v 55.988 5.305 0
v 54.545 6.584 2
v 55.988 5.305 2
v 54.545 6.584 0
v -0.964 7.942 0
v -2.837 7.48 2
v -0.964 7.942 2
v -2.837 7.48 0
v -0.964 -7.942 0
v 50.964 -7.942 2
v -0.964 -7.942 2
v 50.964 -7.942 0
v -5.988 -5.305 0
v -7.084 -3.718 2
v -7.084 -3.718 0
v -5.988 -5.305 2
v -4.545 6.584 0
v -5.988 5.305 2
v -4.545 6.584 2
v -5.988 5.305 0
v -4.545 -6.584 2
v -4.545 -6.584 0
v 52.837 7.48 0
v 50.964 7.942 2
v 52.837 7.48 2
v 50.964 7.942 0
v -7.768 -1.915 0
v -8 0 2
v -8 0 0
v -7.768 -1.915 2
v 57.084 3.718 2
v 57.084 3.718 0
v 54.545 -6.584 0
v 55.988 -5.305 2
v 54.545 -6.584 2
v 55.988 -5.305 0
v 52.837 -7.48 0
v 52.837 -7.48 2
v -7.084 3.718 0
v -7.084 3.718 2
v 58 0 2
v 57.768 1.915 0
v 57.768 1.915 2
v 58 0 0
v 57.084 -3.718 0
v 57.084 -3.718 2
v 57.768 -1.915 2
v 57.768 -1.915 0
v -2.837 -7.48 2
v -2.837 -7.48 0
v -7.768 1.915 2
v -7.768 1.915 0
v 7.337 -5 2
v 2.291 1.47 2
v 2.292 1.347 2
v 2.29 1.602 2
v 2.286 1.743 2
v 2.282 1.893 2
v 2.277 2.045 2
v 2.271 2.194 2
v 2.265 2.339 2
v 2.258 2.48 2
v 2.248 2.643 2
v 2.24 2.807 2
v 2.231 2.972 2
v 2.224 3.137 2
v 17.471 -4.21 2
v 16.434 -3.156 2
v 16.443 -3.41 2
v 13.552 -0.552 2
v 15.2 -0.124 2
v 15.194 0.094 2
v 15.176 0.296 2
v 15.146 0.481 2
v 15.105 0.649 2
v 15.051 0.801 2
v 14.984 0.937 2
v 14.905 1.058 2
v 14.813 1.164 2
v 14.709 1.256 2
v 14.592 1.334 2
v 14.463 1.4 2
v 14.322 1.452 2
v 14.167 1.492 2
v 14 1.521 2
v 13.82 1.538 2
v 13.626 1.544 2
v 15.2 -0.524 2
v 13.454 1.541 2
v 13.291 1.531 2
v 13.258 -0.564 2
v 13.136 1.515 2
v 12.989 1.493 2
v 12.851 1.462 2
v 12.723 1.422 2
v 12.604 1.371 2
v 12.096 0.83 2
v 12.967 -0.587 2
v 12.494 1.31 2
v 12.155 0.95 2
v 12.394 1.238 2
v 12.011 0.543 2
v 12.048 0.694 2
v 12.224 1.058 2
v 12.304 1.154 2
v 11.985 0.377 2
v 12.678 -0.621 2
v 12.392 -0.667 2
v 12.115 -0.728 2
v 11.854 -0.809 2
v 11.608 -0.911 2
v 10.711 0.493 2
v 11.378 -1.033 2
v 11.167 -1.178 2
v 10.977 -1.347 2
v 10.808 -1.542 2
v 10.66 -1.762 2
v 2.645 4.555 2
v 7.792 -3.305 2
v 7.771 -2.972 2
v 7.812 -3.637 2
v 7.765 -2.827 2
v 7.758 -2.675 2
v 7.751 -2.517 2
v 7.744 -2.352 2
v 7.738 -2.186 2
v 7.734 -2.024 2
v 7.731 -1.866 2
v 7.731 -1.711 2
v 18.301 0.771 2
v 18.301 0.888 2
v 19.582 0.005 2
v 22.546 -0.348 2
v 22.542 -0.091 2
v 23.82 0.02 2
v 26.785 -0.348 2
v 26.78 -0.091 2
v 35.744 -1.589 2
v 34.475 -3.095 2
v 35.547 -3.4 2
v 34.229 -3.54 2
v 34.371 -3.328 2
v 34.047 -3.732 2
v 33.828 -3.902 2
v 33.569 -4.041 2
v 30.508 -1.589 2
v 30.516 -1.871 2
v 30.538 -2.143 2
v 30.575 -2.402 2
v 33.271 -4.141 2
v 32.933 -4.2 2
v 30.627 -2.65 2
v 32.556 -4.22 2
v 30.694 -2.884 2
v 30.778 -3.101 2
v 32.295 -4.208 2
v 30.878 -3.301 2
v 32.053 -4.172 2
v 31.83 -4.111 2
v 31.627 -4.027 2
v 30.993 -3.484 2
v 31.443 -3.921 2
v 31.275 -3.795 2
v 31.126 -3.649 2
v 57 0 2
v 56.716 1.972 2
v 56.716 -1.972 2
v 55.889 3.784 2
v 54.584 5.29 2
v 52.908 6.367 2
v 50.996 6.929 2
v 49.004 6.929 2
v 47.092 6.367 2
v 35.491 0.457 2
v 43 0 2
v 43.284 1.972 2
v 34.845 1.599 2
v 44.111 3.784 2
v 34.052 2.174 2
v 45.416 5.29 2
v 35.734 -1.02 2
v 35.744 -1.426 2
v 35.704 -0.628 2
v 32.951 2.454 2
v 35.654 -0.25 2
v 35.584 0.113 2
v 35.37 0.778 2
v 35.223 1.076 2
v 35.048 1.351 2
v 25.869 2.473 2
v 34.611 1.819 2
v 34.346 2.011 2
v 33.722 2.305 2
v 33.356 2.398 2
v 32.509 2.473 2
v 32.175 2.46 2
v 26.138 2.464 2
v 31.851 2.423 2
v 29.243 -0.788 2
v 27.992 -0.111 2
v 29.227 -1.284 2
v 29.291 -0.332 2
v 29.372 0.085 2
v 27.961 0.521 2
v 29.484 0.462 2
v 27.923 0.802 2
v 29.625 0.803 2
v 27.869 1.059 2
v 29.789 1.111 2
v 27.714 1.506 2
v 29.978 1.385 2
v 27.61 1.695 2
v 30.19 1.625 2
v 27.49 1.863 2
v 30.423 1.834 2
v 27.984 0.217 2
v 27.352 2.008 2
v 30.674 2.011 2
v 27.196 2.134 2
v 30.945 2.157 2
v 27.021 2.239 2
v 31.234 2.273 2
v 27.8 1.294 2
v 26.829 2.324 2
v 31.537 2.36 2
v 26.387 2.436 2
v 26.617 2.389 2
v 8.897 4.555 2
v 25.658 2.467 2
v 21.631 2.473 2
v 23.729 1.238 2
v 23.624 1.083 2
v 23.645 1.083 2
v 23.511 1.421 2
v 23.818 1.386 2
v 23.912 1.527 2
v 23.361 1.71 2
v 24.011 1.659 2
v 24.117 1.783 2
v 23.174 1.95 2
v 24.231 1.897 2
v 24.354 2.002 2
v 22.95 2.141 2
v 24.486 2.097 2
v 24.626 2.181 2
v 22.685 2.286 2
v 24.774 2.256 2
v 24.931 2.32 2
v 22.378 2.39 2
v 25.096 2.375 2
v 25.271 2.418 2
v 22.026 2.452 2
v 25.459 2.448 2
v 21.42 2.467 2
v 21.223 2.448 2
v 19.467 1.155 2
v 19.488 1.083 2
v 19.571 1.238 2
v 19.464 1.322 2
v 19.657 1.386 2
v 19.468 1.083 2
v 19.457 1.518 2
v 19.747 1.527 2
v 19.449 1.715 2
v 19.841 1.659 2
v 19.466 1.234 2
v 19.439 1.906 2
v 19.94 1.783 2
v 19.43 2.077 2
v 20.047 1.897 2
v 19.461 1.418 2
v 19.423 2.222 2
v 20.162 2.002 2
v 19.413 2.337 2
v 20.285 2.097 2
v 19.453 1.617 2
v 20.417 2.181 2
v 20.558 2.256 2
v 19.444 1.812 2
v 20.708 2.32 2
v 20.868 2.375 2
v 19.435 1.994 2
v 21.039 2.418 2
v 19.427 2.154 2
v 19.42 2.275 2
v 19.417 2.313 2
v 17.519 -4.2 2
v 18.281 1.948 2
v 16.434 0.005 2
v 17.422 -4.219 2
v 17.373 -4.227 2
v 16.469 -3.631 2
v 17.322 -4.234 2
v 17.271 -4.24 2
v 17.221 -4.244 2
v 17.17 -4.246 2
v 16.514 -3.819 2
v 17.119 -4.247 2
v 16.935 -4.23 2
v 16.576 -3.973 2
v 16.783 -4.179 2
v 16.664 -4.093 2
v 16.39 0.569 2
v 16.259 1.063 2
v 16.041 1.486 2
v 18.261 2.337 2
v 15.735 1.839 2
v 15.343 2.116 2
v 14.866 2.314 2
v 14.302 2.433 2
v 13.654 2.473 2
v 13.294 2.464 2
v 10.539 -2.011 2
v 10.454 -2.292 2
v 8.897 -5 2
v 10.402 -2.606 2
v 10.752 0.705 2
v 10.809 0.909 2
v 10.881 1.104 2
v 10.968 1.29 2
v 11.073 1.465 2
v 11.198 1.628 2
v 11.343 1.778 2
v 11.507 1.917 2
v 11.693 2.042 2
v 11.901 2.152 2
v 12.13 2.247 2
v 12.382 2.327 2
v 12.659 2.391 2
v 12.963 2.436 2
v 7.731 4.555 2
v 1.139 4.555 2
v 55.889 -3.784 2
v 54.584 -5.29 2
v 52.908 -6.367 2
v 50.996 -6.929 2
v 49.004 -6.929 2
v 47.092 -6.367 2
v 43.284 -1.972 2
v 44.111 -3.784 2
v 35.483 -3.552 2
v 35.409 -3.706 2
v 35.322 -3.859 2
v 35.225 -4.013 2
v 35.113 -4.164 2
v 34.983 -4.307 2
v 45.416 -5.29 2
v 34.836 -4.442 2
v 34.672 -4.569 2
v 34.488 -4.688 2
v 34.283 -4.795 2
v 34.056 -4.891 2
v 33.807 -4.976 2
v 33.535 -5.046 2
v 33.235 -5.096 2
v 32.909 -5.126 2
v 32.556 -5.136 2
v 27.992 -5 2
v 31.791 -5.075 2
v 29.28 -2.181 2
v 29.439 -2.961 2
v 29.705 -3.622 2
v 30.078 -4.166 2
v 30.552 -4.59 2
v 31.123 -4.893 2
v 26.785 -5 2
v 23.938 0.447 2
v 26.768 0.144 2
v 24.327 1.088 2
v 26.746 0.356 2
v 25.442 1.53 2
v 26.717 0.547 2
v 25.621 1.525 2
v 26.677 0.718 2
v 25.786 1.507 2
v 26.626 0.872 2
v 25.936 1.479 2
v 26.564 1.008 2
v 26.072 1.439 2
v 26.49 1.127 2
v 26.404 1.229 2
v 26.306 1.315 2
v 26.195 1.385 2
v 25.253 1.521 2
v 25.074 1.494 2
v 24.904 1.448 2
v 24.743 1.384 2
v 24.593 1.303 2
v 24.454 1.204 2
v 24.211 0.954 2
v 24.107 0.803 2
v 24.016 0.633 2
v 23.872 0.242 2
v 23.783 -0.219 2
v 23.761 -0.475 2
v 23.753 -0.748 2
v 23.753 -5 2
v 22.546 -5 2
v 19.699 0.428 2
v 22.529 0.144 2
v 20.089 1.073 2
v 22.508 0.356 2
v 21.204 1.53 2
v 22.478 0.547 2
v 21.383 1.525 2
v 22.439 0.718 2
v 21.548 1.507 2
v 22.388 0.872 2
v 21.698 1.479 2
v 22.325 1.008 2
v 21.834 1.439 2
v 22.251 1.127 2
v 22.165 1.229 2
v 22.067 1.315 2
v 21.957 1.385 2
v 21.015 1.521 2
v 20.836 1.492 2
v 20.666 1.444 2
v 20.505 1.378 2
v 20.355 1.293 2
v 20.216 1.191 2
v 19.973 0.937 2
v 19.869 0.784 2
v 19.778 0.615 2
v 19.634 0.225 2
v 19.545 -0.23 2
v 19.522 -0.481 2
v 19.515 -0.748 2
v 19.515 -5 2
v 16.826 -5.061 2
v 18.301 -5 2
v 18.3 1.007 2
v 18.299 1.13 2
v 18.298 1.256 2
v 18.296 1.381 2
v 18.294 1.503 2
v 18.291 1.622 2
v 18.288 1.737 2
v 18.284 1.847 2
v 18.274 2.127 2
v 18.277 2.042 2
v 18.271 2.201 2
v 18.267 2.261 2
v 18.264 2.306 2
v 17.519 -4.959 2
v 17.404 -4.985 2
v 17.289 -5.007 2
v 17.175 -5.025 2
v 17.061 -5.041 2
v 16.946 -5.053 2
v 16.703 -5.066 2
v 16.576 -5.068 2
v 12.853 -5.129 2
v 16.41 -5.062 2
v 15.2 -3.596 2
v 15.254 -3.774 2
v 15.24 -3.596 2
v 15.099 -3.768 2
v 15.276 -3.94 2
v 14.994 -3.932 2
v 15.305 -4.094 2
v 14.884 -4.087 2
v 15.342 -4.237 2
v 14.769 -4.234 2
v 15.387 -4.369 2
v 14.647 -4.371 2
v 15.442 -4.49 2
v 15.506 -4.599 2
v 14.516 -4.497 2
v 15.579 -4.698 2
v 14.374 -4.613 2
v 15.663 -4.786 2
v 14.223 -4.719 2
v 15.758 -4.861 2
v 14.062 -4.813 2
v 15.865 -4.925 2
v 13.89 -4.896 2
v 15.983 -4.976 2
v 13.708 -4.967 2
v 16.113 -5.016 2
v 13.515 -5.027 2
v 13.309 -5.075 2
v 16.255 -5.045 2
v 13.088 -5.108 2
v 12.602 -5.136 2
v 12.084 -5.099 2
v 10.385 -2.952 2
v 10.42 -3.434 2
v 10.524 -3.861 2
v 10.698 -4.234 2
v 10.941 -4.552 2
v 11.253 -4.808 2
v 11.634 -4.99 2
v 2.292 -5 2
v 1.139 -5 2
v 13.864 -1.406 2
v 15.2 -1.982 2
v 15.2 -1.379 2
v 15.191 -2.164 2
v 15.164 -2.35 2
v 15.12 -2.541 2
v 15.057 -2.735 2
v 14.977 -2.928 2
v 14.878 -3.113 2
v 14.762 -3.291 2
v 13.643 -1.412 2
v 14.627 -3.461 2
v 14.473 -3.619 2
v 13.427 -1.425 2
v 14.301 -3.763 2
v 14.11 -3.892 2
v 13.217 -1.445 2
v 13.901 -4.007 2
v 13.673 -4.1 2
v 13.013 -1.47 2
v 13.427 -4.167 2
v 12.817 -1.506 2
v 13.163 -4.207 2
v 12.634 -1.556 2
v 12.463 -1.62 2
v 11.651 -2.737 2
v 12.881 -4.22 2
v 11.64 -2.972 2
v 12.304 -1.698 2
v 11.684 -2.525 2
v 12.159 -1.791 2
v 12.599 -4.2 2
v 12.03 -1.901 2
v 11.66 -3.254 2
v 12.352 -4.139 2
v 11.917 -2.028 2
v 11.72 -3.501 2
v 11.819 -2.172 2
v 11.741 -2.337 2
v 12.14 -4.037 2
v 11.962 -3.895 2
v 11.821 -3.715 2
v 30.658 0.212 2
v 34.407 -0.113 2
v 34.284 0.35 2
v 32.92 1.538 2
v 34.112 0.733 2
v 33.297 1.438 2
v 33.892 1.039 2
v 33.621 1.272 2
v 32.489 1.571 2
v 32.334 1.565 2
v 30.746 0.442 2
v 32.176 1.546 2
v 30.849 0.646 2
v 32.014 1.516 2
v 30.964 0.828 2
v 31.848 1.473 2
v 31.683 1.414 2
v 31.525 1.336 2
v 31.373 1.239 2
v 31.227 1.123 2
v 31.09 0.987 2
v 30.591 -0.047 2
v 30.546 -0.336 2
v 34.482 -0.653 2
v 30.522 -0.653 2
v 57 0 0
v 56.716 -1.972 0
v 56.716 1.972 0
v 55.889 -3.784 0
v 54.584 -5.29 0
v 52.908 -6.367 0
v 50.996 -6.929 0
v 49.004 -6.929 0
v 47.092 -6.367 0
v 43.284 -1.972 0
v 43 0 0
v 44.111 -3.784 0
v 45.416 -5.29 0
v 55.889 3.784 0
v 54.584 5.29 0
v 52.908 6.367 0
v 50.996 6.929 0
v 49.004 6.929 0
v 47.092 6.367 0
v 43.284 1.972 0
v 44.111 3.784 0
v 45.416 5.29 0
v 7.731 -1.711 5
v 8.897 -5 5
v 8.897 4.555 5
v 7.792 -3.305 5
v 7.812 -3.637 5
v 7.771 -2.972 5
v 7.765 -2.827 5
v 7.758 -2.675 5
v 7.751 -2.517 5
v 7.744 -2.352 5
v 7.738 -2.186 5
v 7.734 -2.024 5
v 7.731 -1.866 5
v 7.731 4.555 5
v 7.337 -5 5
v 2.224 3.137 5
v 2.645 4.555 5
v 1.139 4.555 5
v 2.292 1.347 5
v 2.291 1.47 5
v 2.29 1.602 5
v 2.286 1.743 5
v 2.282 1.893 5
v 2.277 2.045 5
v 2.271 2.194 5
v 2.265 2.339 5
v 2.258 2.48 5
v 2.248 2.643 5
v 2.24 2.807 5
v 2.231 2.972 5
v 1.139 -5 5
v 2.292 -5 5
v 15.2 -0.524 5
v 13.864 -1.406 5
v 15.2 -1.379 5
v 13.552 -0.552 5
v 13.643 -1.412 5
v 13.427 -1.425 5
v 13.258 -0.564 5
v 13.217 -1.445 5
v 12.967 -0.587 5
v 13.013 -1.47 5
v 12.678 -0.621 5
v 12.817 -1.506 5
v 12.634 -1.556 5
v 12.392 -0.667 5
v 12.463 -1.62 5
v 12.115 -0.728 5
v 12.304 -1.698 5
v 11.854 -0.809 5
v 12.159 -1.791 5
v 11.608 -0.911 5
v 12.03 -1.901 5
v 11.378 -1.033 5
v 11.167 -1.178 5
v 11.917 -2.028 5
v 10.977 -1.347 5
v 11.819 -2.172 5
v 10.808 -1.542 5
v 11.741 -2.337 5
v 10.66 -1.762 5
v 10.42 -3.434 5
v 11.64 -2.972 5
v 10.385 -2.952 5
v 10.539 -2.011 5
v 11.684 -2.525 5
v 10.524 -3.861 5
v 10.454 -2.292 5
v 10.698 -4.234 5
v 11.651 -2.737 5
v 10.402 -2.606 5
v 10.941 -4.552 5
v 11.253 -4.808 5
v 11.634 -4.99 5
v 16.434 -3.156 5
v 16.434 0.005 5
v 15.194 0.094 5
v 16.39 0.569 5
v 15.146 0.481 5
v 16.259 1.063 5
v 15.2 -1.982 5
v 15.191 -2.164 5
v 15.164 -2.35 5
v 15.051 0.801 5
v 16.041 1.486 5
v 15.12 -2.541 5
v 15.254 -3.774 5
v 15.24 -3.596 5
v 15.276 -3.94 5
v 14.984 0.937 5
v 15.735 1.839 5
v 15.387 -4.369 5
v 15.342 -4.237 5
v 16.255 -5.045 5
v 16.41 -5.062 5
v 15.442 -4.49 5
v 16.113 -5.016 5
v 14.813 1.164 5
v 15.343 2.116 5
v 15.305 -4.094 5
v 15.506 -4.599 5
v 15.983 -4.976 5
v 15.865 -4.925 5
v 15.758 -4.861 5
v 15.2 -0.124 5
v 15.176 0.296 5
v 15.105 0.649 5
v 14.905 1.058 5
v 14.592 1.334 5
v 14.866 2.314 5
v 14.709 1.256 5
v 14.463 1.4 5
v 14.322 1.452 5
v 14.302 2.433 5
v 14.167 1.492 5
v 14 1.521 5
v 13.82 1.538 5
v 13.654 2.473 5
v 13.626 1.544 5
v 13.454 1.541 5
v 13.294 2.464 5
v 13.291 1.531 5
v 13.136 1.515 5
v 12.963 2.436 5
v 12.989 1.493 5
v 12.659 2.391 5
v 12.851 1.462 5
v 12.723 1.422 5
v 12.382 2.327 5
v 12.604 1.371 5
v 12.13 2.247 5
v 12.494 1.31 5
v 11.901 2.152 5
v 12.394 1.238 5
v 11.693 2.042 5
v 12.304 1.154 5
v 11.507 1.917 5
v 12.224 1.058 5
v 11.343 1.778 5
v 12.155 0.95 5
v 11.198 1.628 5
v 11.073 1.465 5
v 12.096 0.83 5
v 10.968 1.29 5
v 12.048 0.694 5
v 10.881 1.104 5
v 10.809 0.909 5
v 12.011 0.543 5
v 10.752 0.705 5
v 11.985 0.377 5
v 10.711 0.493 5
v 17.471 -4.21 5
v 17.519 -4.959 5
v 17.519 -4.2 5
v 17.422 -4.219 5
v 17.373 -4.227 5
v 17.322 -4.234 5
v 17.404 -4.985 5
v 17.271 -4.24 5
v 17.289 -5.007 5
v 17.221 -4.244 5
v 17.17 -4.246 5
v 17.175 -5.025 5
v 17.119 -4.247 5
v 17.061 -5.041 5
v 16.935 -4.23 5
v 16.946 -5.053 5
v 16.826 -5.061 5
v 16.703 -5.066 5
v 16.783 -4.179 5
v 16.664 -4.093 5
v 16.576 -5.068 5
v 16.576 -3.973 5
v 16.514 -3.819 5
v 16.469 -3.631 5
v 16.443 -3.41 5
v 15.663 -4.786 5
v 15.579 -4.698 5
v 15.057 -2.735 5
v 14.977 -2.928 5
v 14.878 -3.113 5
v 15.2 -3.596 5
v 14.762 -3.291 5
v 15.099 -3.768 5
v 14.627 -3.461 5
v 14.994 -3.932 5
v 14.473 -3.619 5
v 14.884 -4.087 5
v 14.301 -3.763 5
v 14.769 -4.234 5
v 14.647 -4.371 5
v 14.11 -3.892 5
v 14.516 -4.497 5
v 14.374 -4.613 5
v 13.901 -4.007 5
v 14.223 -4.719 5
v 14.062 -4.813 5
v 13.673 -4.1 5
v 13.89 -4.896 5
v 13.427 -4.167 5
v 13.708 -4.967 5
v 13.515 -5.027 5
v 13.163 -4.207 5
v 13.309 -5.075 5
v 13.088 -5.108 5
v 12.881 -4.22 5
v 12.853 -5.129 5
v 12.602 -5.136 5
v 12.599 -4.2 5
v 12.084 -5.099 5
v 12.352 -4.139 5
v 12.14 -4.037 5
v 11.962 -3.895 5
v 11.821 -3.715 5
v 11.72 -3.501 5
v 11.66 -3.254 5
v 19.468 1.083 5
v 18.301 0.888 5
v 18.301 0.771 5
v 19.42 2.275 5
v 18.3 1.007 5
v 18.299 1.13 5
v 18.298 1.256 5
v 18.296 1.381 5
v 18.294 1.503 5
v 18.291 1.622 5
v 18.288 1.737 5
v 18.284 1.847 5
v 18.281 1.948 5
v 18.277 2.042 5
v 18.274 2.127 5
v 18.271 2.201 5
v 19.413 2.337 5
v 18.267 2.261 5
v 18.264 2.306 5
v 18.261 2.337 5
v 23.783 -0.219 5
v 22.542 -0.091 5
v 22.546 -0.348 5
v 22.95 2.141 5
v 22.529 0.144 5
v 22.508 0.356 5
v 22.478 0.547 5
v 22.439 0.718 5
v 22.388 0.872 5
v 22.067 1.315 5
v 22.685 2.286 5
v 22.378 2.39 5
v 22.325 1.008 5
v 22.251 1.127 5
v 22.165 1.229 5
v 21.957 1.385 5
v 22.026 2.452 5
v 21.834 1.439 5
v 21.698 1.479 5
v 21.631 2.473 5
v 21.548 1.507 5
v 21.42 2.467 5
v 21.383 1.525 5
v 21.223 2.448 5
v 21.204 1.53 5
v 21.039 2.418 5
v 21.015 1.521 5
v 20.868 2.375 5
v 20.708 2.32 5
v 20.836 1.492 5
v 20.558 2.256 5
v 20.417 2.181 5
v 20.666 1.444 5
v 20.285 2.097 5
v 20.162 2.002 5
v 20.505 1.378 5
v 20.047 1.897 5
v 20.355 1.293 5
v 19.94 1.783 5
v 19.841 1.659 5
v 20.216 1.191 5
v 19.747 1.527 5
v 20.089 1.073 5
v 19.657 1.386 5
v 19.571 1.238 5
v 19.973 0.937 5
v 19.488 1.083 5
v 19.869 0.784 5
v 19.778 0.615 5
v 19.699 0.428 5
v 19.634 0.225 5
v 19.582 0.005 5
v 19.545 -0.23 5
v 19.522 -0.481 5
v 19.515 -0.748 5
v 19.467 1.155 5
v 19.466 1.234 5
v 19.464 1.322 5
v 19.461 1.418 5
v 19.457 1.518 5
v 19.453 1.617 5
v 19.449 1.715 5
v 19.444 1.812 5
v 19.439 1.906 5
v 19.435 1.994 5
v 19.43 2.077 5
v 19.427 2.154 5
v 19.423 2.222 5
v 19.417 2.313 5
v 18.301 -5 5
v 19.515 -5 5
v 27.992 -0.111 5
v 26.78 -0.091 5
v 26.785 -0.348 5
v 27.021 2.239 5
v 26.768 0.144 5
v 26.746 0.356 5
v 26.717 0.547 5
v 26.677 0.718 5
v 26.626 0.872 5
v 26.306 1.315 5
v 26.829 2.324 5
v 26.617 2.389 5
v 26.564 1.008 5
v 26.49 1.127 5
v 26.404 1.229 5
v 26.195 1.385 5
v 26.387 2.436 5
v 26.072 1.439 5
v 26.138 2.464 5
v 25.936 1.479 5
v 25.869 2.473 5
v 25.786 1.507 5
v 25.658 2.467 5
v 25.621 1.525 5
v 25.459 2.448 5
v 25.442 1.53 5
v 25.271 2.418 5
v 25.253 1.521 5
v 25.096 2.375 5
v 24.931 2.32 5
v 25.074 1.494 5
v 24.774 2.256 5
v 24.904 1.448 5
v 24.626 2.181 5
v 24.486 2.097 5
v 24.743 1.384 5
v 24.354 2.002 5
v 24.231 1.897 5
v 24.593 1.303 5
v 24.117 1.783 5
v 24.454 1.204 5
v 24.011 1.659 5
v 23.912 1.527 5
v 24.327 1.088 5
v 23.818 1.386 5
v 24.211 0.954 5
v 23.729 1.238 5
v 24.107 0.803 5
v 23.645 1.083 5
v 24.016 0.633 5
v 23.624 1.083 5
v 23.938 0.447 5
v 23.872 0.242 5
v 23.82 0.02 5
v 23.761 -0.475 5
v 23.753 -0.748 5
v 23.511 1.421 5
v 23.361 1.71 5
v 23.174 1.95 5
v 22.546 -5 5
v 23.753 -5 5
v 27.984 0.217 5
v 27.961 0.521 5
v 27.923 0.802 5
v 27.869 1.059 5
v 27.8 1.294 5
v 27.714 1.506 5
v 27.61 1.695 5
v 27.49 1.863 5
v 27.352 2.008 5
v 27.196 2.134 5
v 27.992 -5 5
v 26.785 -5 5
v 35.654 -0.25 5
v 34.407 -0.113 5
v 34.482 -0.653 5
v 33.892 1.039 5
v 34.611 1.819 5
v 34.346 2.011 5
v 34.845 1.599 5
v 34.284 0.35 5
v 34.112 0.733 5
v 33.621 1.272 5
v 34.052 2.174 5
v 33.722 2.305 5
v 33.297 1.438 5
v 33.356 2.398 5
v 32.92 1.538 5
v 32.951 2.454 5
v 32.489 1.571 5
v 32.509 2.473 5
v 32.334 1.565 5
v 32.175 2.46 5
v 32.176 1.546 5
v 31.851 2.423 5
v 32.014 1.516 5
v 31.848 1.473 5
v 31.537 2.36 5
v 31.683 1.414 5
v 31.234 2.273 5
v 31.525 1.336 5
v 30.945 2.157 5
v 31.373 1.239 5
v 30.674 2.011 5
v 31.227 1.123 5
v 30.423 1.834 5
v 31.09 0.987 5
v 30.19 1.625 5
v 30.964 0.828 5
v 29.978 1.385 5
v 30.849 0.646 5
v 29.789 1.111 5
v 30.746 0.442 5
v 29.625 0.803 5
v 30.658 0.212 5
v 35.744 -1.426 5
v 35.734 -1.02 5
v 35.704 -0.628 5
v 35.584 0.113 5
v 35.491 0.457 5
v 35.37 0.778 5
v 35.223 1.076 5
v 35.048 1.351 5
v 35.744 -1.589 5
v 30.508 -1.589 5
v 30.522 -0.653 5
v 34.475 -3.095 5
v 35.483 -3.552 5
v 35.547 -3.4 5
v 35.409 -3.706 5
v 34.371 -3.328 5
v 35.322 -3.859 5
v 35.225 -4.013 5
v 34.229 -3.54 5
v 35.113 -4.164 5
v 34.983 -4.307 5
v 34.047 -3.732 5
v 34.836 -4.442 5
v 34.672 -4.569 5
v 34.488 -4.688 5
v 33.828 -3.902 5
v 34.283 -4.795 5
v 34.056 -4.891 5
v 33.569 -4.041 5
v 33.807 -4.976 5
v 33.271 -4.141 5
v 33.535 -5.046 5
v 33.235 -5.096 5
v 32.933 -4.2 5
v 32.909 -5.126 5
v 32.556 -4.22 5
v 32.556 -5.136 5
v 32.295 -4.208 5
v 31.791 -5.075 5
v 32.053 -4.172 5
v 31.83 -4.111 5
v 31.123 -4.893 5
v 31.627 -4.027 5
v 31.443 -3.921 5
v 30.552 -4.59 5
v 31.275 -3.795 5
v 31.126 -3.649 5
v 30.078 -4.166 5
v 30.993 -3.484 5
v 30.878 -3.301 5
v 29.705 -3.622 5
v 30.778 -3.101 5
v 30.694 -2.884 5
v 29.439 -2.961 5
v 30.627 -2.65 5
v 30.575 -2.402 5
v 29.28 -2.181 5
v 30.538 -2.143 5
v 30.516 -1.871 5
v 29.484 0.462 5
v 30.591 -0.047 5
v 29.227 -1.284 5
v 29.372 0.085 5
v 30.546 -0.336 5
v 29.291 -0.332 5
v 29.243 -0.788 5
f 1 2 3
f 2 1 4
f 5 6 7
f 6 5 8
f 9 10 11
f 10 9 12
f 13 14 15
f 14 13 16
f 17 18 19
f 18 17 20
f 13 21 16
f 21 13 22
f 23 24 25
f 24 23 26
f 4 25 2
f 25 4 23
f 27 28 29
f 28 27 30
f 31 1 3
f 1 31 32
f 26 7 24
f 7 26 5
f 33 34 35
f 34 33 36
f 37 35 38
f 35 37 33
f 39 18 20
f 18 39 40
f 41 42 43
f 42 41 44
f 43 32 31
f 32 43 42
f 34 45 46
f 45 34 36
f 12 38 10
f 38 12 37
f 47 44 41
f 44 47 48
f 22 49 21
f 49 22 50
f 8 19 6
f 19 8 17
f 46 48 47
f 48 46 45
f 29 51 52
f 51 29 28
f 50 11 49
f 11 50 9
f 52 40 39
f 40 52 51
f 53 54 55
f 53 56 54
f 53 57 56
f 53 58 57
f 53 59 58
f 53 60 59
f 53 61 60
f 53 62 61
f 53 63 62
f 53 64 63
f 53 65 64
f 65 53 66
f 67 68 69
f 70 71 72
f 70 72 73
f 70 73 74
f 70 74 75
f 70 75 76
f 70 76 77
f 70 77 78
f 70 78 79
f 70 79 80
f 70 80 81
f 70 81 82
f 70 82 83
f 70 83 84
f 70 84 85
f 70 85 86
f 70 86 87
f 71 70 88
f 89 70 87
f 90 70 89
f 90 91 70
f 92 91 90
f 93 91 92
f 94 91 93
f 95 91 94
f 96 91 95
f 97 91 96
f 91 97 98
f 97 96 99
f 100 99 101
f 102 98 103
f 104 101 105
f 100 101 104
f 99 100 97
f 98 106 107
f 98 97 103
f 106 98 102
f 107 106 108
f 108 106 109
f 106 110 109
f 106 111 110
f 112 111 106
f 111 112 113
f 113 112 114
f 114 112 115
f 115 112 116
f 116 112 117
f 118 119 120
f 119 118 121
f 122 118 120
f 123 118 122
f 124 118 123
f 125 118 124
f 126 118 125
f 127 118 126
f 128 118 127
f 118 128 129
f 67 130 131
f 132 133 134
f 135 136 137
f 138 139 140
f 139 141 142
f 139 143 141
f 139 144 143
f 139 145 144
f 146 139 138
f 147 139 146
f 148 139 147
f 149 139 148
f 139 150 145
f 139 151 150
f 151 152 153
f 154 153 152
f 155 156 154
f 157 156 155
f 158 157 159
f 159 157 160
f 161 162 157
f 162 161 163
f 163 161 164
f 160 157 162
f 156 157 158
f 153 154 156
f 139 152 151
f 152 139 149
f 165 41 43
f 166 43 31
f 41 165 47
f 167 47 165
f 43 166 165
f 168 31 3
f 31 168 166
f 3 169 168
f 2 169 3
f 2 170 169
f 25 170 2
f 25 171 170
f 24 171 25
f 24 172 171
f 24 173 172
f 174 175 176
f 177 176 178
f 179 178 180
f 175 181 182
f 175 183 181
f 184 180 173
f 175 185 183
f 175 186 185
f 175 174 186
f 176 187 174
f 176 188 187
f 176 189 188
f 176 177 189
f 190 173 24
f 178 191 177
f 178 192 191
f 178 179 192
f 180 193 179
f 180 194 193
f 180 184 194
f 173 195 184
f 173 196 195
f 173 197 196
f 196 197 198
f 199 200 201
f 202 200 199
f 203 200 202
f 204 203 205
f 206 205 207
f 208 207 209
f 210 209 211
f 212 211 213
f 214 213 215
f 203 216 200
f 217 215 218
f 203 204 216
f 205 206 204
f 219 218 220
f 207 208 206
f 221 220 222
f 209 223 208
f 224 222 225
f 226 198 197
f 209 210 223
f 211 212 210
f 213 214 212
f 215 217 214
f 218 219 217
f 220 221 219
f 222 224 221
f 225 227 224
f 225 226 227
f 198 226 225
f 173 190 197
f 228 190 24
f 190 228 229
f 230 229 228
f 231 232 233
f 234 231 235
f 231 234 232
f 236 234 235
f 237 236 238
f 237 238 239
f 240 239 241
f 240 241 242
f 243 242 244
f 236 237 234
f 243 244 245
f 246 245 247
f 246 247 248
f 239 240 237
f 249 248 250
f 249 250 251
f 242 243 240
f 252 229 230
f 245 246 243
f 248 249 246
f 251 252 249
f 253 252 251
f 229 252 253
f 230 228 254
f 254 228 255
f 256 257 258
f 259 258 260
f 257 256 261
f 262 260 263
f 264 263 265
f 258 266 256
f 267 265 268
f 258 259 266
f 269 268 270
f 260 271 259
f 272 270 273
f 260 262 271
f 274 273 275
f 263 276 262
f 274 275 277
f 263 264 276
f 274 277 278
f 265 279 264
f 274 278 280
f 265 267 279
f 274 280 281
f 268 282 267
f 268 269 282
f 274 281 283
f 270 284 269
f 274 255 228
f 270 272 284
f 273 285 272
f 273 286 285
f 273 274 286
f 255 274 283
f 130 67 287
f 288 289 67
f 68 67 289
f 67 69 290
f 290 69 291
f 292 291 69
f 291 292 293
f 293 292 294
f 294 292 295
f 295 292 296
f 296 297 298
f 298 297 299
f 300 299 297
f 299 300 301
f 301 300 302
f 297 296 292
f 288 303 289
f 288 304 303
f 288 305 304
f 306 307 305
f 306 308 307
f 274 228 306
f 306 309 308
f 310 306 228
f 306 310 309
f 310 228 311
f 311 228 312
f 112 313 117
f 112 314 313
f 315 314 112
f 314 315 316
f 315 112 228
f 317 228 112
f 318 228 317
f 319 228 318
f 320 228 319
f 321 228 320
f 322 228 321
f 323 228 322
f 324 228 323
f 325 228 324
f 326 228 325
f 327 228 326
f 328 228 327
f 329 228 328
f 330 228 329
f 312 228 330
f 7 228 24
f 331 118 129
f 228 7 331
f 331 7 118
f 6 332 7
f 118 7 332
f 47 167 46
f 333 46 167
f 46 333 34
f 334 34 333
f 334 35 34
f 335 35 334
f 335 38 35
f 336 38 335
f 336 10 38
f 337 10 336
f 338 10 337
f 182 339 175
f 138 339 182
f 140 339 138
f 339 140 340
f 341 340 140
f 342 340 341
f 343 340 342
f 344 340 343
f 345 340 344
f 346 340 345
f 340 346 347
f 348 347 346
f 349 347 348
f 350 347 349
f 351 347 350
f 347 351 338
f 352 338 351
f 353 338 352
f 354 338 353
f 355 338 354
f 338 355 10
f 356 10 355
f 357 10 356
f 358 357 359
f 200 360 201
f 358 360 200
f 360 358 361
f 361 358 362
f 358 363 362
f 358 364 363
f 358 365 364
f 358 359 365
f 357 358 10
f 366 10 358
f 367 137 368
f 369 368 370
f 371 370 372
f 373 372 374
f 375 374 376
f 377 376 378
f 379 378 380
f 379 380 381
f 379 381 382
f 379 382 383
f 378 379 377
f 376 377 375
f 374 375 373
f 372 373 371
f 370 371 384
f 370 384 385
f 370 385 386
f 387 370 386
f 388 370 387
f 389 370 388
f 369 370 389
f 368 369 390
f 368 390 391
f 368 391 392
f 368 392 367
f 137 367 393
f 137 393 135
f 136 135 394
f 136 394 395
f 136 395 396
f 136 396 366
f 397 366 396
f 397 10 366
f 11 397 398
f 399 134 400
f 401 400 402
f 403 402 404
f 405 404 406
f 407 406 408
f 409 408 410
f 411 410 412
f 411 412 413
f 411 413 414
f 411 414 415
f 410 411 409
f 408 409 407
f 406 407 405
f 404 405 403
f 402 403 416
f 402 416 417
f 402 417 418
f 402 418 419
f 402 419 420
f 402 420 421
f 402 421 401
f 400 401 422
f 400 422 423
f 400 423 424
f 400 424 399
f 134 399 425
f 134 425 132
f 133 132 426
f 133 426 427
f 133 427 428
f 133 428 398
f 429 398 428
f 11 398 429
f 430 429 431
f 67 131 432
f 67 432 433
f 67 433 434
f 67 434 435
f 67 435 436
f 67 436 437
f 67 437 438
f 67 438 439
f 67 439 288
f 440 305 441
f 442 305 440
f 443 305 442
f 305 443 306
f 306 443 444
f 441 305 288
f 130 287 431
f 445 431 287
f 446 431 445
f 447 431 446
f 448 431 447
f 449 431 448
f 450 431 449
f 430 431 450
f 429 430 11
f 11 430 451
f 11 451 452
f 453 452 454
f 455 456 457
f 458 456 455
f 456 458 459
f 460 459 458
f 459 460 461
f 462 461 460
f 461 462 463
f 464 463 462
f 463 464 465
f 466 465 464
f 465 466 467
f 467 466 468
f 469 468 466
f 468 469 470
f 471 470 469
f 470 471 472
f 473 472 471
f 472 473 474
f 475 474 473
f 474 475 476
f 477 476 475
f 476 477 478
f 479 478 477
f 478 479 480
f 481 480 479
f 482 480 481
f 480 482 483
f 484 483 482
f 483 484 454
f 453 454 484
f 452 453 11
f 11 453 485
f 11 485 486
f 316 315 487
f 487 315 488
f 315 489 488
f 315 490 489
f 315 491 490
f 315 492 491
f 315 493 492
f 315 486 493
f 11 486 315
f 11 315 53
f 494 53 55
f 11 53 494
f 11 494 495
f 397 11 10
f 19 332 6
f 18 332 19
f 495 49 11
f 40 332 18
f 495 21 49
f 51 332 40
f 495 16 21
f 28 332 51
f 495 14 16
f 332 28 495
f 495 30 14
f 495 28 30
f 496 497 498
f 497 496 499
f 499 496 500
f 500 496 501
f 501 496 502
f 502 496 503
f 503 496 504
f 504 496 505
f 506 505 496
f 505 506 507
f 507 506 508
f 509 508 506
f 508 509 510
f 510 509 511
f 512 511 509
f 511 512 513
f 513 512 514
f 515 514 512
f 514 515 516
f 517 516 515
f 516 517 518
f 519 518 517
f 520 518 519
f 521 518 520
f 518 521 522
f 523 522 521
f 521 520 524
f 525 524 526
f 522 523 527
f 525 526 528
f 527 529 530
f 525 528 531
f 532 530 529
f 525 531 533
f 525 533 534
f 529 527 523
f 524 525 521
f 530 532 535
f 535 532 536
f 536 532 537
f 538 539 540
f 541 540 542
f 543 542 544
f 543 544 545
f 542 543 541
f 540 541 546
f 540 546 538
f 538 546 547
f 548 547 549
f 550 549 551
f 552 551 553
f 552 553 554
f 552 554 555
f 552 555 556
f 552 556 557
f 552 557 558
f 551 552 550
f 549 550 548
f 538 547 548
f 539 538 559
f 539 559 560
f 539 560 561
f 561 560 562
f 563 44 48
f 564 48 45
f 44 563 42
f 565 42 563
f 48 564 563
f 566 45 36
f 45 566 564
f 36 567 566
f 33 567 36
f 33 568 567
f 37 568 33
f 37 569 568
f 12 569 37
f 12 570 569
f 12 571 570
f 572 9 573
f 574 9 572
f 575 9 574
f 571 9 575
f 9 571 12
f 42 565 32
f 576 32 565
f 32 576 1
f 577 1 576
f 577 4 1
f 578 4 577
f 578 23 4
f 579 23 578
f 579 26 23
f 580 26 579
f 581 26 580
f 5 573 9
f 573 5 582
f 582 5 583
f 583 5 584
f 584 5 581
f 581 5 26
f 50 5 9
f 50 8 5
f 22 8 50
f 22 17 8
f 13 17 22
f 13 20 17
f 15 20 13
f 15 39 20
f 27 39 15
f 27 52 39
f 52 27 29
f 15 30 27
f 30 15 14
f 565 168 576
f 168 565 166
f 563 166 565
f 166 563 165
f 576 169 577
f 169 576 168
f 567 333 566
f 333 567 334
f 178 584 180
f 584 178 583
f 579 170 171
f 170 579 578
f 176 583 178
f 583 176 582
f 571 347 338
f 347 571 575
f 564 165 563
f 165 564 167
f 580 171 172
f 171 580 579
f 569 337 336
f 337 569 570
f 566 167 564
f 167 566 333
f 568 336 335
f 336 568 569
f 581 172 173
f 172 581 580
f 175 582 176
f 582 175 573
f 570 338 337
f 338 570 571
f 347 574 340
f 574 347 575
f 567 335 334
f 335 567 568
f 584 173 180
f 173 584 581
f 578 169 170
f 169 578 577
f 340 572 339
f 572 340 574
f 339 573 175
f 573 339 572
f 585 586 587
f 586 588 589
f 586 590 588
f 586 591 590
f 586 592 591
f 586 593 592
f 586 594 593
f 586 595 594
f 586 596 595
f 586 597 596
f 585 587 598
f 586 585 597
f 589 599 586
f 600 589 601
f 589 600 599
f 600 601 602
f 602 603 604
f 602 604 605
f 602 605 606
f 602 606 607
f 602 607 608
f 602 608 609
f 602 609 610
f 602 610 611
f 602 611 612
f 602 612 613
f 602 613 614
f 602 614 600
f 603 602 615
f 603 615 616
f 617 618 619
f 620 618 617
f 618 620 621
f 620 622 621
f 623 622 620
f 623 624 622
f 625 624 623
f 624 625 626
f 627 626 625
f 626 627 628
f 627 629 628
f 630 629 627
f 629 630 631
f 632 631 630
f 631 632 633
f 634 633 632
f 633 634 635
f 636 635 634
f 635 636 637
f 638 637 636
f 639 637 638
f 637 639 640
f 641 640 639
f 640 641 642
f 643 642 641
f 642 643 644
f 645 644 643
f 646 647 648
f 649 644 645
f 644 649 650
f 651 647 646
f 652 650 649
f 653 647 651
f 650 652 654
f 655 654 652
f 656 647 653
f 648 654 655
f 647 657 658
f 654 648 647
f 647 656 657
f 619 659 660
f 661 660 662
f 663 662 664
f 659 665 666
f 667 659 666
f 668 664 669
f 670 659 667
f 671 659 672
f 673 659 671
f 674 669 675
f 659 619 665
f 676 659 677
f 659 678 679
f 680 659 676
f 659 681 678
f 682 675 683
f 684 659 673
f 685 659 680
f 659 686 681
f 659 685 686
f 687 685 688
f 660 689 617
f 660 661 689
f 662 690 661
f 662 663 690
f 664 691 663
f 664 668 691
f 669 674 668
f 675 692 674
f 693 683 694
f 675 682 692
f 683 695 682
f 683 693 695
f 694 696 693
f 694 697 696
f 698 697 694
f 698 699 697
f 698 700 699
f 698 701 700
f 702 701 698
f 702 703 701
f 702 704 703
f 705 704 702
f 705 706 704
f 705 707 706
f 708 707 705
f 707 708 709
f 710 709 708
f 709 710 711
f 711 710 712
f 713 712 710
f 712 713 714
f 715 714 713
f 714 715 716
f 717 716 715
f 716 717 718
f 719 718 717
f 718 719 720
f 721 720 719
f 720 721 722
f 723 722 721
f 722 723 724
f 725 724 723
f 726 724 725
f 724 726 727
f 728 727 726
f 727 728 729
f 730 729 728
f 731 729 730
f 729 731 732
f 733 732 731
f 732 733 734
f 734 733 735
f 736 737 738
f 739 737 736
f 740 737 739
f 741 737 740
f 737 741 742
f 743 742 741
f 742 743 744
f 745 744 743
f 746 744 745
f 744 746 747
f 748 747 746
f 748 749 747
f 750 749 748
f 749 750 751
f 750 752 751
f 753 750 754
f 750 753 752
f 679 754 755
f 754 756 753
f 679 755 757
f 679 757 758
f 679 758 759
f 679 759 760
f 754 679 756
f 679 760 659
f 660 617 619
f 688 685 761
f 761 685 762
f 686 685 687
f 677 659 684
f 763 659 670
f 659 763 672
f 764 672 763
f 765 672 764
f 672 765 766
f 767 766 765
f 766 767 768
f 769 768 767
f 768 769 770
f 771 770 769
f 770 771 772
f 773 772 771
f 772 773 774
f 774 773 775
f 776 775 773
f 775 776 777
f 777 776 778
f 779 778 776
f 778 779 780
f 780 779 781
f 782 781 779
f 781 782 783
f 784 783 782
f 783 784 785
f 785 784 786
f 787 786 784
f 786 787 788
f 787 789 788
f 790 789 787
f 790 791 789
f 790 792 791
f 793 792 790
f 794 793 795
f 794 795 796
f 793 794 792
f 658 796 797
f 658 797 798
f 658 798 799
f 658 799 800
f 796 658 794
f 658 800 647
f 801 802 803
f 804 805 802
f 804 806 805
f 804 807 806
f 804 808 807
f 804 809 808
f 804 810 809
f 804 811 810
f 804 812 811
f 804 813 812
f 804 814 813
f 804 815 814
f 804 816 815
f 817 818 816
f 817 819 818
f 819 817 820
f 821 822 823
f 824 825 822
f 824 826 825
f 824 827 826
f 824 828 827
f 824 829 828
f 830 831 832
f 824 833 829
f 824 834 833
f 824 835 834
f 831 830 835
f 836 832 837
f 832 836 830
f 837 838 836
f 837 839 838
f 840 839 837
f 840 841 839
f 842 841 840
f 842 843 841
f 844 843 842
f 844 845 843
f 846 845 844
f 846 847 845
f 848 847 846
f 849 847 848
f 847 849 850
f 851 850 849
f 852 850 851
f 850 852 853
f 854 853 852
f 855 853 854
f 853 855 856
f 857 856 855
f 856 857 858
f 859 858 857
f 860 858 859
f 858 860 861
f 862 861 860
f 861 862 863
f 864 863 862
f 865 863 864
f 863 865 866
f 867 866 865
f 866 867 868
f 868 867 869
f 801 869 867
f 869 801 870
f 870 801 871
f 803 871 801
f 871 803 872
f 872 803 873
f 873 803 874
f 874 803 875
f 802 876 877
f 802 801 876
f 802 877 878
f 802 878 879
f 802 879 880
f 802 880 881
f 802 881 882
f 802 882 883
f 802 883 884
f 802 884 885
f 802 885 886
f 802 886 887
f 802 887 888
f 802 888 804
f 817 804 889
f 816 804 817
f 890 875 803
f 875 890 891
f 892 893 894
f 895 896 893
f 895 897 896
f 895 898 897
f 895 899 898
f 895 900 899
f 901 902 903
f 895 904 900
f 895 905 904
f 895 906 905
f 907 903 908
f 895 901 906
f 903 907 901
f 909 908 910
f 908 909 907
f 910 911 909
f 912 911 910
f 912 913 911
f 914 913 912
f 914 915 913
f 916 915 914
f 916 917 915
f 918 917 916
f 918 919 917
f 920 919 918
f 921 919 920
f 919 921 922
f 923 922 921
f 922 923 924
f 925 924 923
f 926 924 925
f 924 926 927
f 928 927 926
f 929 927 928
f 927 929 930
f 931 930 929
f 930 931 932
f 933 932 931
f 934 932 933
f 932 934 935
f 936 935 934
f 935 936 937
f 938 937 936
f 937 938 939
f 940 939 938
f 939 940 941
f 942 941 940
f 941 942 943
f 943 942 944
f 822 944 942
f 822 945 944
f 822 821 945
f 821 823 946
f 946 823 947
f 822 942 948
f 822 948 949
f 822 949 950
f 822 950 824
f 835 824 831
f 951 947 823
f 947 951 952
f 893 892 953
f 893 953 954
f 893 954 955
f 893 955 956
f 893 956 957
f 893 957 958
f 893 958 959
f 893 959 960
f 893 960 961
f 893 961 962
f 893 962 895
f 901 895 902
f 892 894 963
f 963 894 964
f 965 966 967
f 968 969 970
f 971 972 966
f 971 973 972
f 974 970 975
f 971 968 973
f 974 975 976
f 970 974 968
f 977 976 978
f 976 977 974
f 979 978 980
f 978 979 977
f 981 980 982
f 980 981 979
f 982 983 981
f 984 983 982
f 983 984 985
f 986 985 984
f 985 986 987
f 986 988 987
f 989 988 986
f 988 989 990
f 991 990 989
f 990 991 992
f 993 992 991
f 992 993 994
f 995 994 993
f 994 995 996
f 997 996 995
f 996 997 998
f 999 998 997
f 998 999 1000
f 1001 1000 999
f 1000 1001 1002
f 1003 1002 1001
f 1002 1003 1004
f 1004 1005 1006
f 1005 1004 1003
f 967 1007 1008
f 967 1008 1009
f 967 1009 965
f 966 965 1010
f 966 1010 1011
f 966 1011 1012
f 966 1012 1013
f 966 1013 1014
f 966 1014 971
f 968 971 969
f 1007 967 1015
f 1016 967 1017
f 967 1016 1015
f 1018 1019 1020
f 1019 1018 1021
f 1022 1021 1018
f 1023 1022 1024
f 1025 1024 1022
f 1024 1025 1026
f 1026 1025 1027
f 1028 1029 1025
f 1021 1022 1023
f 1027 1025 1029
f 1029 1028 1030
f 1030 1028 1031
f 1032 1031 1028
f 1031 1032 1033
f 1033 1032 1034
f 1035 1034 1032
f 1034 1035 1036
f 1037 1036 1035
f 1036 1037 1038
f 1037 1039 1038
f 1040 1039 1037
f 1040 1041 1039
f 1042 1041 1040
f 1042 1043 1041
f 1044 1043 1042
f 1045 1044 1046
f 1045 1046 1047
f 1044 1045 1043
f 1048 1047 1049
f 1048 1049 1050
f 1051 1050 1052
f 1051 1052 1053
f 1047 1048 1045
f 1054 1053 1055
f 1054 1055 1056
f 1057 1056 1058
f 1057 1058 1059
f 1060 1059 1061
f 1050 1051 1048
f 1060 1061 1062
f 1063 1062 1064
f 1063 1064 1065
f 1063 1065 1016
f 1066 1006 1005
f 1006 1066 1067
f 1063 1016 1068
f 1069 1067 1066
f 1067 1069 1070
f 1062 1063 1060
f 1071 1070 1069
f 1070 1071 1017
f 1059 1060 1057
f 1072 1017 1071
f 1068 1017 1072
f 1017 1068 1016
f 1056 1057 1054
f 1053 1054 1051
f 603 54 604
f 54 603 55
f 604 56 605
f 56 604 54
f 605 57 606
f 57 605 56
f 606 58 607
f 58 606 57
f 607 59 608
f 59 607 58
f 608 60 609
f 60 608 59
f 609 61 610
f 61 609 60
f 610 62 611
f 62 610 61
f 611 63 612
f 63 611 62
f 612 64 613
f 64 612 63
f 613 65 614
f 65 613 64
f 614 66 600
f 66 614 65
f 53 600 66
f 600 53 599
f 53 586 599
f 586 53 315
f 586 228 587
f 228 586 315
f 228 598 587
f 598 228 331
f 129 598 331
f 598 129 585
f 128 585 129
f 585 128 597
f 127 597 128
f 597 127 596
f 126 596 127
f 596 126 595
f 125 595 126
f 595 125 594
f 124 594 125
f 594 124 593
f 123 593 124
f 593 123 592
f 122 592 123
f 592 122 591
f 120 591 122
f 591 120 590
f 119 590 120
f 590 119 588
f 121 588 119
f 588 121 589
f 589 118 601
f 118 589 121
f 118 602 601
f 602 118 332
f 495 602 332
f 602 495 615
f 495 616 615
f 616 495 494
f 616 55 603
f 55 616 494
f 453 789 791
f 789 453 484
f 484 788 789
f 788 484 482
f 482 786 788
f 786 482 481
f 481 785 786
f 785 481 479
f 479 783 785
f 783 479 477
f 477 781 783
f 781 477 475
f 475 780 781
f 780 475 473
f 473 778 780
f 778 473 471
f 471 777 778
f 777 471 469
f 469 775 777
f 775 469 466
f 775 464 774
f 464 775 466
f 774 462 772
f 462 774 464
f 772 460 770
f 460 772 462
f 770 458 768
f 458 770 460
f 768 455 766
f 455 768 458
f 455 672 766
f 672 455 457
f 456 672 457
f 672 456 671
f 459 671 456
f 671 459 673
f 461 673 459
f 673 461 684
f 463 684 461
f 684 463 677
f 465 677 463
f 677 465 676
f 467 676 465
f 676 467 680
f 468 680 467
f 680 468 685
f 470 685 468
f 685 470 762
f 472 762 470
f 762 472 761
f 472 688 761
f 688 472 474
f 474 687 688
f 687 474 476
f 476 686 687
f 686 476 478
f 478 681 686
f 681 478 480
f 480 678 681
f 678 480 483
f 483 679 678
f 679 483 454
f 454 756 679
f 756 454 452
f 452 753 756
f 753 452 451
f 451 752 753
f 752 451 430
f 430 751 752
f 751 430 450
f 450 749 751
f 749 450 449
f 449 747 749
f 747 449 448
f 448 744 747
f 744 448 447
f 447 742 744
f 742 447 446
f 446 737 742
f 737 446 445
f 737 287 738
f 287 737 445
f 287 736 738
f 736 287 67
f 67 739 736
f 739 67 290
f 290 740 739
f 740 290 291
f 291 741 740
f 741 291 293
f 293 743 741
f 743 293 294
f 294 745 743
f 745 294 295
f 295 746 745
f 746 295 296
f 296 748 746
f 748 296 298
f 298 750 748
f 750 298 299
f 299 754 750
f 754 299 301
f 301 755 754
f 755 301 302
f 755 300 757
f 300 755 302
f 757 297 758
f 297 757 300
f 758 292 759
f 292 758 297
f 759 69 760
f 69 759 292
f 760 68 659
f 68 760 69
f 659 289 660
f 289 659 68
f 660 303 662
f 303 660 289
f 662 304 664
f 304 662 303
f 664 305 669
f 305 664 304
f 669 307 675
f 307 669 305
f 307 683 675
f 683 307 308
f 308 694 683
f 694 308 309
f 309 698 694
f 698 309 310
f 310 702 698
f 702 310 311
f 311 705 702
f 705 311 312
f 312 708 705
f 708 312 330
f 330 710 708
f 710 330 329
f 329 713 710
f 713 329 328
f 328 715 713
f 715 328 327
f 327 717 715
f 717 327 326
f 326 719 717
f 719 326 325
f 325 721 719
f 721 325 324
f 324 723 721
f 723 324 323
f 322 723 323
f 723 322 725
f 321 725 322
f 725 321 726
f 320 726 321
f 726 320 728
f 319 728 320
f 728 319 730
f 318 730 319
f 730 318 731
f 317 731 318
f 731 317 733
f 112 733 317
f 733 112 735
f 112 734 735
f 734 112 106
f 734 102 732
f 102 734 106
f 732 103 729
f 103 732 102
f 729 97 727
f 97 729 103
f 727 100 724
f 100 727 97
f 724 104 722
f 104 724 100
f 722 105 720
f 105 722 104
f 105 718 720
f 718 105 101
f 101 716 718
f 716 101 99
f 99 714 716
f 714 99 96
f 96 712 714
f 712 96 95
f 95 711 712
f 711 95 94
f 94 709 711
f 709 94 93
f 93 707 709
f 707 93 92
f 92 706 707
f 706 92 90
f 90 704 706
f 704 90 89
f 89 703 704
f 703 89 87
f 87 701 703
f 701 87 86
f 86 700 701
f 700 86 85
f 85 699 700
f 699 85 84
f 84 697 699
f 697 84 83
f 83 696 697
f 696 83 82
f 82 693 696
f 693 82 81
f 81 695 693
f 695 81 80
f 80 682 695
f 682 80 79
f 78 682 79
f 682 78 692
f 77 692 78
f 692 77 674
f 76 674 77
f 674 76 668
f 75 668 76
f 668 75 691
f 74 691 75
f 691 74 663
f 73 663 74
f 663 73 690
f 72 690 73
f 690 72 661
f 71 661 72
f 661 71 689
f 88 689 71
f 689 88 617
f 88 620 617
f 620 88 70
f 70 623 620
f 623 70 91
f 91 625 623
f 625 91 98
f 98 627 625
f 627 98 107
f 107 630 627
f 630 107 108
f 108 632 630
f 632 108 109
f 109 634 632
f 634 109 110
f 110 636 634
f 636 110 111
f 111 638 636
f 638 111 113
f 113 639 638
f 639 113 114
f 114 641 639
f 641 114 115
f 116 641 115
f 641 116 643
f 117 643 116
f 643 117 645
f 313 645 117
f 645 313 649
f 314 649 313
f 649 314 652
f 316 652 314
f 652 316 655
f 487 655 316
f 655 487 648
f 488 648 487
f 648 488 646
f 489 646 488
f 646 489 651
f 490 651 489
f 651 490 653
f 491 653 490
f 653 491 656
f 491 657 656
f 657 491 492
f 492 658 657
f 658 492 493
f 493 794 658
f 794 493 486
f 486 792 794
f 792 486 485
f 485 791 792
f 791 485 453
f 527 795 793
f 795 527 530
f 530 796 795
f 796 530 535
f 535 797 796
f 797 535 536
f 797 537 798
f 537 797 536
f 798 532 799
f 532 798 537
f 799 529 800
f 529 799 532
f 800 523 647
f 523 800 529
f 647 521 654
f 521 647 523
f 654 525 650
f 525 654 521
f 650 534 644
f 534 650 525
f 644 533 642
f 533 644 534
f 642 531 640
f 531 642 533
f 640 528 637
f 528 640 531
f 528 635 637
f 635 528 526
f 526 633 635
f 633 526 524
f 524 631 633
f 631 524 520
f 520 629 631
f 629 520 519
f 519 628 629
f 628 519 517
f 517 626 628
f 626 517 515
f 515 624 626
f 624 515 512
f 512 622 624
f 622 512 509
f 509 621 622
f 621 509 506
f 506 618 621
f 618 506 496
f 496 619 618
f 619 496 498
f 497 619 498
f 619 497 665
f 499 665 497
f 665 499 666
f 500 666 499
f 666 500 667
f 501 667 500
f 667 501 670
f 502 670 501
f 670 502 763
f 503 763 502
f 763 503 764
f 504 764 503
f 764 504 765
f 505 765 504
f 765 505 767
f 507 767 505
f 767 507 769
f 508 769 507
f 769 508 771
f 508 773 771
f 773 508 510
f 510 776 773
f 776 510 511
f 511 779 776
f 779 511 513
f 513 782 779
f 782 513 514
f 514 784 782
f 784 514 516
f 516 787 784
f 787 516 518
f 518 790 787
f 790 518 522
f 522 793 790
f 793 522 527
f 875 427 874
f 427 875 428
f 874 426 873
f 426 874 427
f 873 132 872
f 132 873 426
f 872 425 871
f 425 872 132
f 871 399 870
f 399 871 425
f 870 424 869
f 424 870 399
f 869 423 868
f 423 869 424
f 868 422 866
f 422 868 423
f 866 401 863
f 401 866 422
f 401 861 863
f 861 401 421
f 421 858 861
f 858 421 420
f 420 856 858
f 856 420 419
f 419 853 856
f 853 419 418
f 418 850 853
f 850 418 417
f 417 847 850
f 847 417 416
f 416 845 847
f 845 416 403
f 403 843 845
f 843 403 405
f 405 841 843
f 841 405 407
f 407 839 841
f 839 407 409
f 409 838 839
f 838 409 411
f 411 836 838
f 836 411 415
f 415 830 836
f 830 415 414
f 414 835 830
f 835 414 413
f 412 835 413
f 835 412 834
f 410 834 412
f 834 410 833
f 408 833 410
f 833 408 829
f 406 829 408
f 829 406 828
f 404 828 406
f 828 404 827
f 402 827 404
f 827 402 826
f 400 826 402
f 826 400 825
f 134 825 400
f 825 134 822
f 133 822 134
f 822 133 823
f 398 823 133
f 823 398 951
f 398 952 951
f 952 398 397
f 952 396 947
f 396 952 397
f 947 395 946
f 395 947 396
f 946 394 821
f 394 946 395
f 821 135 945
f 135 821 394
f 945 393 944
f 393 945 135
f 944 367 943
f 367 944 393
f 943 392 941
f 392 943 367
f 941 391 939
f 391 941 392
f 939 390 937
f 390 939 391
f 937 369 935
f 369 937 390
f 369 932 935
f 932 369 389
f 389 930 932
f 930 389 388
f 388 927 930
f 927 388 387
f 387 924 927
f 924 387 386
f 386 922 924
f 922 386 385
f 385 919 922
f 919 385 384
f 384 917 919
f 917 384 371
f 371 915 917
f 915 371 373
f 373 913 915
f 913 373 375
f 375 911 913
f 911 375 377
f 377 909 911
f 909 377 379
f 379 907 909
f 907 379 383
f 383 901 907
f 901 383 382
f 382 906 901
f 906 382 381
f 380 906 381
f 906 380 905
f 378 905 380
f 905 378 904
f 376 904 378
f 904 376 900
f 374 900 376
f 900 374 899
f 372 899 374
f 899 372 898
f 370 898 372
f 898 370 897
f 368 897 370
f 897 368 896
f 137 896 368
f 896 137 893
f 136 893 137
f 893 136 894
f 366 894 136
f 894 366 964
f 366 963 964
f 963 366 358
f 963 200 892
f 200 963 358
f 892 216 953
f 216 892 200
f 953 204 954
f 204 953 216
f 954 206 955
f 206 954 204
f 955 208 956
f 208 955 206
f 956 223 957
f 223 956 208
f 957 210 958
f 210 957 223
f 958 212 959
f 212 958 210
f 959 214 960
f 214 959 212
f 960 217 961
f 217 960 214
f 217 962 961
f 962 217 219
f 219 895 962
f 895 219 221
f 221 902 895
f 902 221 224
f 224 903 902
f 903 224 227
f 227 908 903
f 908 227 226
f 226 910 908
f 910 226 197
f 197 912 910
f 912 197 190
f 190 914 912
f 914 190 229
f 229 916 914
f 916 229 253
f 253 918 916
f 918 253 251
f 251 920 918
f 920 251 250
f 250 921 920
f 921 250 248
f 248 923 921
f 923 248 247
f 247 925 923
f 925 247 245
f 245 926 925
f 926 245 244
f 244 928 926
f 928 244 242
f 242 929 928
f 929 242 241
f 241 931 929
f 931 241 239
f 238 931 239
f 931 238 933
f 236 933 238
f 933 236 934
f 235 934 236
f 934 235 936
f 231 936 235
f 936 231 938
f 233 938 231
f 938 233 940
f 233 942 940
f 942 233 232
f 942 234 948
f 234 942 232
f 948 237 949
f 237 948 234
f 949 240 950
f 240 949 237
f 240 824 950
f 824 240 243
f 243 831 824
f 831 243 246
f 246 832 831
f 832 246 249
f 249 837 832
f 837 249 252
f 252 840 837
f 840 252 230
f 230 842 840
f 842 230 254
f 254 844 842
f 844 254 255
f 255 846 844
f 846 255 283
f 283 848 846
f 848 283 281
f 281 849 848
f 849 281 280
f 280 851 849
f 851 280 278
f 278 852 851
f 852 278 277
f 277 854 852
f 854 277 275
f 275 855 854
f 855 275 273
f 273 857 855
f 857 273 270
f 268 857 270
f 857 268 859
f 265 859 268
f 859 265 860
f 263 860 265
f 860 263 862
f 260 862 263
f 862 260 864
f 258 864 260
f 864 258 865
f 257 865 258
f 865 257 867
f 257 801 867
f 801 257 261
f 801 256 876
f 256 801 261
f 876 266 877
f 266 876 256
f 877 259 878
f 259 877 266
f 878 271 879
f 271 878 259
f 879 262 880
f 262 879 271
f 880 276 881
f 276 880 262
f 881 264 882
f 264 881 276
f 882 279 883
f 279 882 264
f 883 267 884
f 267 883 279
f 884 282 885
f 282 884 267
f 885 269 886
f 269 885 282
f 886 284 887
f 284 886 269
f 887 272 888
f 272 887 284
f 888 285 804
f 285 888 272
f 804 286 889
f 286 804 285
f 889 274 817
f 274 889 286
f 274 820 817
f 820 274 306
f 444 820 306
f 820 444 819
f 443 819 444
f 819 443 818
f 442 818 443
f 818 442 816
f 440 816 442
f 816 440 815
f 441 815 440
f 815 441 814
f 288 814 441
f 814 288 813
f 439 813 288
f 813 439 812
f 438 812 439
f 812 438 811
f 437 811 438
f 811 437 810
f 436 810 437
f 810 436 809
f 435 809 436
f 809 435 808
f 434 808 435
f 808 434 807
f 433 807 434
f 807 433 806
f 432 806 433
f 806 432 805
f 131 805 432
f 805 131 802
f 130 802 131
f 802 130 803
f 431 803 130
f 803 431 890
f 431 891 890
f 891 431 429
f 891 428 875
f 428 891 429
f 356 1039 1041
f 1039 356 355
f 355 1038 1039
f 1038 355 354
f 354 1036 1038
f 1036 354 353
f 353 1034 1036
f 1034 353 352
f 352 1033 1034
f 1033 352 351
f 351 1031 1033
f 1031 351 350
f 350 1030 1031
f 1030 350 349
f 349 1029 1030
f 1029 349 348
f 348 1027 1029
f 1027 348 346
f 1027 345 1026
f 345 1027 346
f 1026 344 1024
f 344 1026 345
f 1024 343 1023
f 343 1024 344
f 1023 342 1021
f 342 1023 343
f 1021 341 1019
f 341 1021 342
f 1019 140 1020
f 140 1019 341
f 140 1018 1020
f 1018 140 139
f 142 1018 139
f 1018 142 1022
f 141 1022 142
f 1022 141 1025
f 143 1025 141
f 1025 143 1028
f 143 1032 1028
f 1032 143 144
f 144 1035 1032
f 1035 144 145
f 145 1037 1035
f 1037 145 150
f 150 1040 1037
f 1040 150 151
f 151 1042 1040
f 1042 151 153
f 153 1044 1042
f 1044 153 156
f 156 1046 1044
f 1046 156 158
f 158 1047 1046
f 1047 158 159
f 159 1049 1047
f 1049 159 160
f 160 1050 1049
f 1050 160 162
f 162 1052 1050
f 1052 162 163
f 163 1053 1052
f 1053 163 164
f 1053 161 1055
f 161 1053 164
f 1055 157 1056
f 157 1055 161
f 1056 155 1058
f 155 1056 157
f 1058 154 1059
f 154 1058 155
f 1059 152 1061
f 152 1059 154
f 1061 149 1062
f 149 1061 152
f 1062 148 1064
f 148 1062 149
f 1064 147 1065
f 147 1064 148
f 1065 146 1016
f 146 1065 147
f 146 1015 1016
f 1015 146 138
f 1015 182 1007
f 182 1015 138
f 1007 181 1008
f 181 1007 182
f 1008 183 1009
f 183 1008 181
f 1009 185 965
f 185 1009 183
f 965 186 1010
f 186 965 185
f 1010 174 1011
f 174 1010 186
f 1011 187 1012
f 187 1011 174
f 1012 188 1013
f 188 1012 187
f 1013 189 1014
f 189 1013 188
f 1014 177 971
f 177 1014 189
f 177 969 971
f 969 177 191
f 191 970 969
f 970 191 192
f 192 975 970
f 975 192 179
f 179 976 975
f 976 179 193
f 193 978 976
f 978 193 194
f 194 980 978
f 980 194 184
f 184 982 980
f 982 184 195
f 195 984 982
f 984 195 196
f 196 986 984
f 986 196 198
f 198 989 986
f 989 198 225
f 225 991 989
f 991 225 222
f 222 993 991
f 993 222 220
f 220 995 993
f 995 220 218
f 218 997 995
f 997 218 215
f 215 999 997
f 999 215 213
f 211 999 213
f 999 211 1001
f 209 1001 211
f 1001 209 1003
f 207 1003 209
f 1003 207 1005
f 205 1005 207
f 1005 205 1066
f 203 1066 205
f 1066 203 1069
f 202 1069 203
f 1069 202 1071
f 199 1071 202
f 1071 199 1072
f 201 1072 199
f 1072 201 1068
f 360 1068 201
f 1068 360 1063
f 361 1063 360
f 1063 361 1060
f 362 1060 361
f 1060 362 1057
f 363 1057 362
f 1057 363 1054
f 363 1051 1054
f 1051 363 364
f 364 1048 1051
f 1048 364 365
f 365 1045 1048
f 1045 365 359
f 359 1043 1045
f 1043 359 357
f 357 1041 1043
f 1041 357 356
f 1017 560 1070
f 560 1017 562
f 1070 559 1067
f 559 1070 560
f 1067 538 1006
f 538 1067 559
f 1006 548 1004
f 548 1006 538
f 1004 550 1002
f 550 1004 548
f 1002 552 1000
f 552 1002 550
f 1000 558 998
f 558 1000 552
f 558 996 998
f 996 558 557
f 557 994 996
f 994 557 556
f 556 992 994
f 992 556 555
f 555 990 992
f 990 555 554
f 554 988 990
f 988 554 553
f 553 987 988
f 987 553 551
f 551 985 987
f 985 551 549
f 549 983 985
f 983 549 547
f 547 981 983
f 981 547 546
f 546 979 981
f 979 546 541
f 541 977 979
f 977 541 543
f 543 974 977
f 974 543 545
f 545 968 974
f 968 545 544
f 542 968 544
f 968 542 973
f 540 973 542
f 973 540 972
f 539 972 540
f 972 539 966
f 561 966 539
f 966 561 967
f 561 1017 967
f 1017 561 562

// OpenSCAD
/* text */
name = "Name"; 
translate([0,-5,0])
linear_extrude(height = 5)
text(name);




difference() {
//cut this
    hull(){
        cylinder(h=2, d=16);
        translate([50,0,0])
        cylinder(h=2, d=16);
    }
//with this
    
    translate([50,0,0])
    cylinder(h=2, d=14);
    
}
